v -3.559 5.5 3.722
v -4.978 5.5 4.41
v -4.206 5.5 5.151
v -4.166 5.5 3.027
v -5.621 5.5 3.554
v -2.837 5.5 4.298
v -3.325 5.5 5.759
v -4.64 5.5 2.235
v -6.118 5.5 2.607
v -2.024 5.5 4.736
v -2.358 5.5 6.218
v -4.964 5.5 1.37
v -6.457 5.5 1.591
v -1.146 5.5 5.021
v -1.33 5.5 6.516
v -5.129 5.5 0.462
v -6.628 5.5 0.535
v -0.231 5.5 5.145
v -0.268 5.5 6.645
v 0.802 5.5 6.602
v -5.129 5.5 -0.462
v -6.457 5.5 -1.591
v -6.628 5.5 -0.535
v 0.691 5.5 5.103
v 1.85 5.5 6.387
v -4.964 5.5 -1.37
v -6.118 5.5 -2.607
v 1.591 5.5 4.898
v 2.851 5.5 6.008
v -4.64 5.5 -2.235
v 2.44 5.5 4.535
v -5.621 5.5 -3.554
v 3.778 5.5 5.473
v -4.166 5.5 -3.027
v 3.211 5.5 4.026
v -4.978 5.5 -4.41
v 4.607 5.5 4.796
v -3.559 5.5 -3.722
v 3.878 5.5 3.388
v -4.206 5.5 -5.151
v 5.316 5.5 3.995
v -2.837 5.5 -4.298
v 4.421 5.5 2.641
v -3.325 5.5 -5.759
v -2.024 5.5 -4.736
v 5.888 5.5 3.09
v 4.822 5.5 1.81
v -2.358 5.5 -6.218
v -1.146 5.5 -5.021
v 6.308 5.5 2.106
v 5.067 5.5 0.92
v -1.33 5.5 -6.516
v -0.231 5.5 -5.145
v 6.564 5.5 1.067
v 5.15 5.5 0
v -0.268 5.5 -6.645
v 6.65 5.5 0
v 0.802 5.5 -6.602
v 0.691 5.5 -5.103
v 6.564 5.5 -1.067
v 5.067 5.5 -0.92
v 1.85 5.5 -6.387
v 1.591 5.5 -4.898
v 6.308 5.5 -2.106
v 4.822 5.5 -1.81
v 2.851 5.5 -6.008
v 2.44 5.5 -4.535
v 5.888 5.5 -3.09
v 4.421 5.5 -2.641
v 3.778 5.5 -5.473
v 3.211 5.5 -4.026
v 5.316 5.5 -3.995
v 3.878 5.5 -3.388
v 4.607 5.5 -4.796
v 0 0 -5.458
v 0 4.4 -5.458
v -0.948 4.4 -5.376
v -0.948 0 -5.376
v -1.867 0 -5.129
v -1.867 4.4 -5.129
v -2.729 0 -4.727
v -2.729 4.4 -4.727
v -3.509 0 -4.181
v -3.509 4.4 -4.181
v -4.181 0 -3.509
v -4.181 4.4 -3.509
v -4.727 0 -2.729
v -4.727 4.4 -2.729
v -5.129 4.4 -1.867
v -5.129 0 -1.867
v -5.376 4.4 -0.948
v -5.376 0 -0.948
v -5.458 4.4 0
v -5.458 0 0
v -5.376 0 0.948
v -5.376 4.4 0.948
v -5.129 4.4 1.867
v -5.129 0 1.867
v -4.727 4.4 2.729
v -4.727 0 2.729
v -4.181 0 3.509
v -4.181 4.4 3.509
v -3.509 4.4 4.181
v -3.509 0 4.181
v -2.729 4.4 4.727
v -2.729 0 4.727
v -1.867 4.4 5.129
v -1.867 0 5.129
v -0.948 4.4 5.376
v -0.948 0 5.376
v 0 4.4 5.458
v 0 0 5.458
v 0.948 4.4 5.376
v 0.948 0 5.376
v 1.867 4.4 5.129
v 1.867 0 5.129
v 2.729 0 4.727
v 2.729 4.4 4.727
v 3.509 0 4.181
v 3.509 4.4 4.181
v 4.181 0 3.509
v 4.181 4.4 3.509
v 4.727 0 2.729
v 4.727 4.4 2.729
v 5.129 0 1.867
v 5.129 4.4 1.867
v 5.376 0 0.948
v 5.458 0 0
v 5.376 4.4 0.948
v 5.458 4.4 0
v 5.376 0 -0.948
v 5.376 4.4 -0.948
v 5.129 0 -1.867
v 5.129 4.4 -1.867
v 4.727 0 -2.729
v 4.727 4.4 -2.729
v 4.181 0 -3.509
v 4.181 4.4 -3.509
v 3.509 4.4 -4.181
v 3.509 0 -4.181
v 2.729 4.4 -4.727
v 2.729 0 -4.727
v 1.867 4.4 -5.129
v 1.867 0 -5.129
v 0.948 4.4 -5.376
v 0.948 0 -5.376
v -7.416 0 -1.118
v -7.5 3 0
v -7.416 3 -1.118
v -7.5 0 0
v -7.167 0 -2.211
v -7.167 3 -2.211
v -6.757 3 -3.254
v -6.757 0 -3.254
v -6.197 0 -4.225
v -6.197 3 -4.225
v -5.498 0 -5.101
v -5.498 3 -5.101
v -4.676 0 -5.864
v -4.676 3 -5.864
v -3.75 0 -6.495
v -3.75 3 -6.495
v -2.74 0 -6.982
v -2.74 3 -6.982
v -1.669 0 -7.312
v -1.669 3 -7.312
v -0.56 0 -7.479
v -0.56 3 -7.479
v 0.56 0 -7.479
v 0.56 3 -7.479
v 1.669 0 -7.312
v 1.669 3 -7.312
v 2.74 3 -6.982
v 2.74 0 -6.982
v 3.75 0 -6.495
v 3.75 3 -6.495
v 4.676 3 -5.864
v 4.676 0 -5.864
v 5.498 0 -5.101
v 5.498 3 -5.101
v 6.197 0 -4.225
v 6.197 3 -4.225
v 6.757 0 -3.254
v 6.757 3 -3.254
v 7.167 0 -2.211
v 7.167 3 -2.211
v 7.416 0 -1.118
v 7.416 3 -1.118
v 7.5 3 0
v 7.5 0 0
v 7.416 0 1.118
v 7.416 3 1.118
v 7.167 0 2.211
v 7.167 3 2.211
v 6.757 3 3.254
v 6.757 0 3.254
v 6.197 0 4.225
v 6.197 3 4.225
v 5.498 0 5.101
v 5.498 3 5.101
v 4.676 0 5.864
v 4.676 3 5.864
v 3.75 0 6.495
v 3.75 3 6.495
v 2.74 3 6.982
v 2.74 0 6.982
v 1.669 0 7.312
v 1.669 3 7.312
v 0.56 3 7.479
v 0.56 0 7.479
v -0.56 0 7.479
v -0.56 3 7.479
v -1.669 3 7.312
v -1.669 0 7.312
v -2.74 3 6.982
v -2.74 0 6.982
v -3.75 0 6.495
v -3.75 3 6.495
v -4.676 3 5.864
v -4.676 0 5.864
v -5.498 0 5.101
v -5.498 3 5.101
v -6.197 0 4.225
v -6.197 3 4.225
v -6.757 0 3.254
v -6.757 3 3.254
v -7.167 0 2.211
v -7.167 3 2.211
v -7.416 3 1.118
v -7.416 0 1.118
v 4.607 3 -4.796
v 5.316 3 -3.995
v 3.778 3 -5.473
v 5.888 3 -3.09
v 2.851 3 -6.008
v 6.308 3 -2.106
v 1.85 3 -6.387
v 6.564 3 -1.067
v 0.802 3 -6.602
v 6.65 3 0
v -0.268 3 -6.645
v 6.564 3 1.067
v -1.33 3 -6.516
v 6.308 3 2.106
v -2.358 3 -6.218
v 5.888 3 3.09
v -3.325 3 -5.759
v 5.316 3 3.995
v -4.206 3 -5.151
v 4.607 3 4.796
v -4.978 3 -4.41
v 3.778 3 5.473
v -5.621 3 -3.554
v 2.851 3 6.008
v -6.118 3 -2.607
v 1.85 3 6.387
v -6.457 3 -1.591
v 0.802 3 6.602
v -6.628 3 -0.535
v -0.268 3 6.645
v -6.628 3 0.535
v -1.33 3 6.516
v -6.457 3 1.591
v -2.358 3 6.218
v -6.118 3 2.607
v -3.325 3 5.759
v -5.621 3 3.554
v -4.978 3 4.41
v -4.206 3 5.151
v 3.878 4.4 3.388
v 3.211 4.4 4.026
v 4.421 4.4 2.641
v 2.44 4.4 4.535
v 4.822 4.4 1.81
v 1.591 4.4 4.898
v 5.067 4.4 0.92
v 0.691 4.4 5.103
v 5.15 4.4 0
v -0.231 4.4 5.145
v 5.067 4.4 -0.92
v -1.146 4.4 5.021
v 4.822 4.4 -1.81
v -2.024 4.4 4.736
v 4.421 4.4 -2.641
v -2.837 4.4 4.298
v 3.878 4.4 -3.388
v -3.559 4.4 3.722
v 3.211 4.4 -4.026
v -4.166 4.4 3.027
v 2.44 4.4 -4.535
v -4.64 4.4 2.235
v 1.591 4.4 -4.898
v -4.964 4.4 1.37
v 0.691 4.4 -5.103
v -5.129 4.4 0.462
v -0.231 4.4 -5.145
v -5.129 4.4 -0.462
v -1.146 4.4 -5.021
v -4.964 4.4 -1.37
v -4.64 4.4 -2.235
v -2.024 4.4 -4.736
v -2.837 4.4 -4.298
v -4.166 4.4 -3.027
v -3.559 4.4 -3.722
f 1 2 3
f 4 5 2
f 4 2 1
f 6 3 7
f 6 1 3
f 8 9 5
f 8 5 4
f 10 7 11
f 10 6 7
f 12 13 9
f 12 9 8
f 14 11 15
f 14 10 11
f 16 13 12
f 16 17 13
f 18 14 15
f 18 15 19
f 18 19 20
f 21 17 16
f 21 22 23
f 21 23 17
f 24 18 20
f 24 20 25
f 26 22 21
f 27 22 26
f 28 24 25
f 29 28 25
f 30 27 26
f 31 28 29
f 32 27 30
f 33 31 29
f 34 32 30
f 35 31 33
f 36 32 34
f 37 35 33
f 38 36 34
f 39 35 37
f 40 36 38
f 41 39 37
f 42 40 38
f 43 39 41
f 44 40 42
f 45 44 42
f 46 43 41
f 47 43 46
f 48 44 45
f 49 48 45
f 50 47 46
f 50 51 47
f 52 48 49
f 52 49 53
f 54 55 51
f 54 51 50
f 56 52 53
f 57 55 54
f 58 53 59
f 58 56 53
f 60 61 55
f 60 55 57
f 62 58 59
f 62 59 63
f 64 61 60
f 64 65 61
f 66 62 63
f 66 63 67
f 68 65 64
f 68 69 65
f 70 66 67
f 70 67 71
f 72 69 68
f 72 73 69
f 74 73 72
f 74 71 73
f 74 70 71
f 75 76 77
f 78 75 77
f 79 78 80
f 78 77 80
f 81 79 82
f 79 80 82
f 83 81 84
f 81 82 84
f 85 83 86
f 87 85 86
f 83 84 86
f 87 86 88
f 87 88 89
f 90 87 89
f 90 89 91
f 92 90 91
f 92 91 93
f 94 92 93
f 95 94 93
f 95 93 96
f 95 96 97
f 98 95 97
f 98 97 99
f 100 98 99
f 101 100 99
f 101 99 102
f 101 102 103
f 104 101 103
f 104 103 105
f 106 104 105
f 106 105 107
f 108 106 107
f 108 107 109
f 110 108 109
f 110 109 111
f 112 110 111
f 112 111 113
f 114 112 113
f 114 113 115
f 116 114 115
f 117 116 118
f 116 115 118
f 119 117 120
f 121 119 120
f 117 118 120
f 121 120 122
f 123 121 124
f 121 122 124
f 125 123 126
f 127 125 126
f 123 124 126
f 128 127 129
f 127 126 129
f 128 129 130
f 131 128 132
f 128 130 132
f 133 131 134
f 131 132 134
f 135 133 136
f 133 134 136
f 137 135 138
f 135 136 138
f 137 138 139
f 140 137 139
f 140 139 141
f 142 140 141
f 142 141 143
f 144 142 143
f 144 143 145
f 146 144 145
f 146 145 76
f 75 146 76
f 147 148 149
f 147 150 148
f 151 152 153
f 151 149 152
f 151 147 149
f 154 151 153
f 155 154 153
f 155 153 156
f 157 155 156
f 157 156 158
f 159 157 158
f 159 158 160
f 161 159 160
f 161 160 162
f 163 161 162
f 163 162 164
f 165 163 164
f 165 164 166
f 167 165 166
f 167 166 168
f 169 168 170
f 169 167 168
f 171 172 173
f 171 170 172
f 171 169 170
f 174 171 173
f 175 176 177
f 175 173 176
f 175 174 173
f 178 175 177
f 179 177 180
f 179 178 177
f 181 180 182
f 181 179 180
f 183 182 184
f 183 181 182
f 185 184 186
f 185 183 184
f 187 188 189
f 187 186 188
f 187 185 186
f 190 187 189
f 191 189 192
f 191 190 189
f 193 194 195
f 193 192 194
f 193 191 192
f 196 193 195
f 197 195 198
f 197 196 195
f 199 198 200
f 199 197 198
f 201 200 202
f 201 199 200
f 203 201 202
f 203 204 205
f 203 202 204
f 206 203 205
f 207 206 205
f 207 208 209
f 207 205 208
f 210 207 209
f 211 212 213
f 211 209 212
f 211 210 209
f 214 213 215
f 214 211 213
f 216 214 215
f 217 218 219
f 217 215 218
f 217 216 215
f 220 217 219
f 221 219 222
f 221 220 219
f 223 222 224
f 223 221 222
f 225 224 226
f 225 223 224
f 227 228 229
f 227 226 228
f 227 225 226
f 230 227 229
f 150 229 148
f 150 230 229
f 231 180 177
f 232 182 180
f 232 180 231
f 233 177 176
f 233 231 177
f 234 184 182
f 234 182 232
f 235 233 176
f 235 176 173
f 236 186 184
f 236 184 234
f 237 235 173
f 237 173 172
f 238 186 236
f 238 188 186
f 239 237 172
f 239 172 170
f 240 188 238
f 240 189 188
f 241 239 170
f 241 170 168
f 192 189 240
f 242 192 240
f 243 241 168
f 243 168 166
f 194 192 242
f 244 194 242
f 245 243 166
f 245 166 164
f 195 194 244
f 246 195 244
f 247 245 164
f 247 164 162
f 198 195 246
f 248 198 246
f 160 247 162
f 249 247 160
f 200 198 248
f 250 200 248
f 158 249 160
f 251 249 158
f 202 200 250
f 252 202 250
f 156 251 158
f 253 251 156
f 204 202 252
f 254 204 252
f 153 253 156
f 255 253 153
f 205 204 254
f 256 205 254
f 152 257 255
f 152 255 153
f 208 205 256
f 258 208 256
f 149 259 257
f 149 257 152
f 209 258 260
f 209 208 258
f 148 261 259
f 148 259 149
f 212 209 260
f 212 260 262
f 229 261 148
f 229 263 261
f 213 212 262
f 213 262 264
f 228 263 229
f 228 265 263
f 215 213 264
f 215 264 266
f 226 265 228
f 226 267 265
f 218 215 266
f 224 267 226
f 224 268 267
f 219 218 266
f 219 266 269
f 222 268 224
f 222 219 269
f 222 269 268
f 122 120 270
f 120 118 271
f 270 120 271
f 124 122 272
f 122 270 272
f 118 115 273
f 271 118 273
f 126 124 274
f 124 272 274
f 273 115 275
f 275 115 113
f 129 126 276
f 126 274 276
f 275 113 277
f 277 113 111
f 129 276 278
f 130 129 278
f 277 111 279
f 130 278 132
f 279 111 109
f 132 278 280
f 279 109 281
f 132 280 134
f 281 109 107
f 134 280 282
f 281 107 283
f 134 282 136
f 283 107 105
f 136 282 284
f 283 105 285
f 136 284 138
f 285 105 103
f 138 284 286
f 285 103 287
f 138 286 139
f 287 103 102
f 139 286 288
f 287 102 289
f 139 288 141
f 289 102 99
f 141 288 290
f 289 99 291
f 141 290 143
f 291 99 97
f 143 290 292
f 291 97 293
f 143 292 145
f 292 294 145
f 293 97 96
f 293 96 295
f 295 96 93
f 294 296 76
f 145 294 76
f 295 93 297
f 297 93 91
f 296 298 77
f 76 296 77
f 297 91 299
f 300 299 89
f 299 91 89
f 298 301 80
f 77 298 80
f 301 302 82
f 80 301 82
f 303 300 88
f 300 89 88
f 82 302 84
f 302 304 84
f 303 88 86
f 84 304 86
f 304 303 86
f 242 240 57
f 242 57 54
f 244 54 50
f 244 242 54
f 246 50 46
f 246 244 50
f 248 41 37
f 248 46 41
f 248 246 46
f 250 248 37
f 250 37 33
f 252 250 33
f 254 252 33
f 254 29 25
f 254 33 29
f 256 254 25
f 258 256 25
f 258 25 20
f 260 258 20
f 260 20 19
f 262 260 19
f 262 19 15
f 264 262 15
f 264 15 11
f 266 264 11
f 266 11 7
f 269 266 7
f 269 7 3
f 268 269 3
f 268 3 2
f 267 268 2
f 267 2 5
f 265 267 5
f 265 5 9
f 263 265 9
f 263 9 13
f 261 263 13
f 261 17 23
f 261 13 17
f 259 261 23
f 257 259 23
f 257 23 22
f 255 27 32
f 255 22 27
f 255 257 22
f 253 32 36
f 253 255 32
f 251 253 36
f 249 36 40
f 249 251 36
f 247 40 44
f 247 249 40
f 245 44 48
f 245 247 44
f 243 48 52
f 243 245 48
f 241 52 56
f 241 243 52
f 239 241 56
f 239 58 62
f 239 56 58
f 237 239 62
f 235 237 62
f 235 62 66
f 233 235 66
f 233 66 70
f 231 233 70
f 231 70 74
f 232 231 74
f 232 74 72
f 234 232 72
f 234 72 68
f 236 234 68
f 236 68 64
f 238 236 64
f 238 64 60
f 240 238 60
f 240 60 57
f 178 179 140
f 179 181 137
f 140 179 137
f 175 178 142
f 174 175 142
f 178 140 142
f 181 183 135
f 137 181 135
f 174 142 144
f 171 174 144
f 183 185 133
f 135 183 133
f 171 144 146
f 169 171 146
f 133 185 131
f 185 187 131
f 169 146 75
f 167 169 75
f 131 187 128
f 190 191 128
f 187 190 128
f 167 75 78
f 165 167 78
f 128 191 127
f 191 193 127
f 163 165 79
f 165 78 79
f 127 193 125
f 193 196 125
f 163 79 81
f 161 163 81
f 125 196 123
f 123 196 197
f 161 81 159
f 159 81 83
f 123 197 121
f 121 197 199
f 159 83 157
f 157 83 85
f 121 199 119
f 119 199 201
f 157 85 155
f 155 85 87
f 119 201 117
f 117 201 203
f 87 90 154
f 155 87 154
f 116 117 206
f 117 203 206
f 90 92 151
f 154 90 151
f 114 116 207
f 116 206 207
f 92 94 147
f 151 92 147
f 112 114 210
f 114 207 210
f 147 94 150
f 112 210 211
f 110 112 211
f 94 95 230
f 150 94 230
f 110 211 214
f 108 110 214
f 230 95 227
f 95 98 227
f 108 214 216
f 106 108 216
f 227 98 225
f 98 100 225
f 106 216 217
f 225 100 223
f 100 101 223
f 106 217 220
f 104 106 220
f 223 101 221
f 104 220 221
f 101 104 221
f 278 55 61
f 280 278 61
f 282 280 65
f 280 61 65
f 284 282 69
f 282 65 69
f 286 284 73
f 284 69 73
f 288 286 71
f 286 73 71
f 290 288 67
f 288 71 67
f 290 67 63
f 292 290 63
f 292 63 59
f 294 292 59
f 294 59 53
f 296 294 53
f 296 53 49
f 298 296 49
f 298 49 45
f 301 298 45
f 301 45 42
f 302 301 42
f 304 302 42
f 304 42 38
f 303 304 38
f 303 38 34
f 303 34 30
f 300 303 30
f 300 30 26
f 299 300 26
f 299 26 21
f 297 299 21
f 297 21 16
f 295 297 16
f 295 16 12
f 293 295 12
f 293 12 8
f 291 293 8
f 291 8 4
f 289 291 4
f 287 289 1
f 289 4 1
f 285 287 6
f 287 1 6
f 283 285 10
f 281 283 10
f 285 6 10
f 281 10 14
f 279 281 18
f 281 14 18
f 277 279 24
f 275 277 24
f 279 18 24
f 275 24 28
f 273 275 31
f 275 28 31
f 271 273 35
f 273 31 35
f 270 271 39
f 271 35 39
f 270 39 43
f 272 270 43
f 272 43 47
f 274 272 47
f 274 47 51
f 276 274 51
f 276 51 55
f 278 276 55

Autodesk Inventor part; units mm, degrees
ref_plane "YZ Plane" through (0, 0, 0) normal (1, 0, 0) x (0, 1, 0)
ref_plane "XZ Plane" through (0, 0, 0) normal (0, 1, 0) x (-1, 0, 0)
ref_plane "XY Plane" through (0, 0, 0) normal (0, 0, 1) x (1, 0, 0)
sketch "Sketch1" plane through (0, 0, 0) normal (0, 1, 0) x (-1, 0, 0)
  circle A0 centre (0, 0) radius 7.5
  dimension "d0" = 15
extrude "Extrusion1" add sketch "Sketch1" along normal blind 3
sketch "Sketch2" plane through (0, 3, 0) normal (0, 1, 0) x (1, 0, 0)
  circle A0 centre (0, 0) radius 7.5 projected
  circle A1 centre (0, 0) radius 6.65
  dimension "d3" = 13.3
extrude "Extrusion2" add sketch "Sketch2" along normal blind 2.5 contours A1
sketch "Sketch3" plane through (0, 5.5, 0) normal (0, 1, 0) x (1, 0, 0)
  circle A0 centre (0, 0) radius 6.65 projected
  circle A1 centre (0, 0) radius 5.15
  dimension "d6" = 10.3
extrude "Extrusion3" cut sketch "Sketch3" against normal through all contours A1
hole "Hole1" at (0, 0, 0) direction (0, 1, 0) diameter 10.917 depth 4.4 thread size "M12x1" class "6H" standard "ISO Metric profile"
properties part number "500-102" material "Steel"
